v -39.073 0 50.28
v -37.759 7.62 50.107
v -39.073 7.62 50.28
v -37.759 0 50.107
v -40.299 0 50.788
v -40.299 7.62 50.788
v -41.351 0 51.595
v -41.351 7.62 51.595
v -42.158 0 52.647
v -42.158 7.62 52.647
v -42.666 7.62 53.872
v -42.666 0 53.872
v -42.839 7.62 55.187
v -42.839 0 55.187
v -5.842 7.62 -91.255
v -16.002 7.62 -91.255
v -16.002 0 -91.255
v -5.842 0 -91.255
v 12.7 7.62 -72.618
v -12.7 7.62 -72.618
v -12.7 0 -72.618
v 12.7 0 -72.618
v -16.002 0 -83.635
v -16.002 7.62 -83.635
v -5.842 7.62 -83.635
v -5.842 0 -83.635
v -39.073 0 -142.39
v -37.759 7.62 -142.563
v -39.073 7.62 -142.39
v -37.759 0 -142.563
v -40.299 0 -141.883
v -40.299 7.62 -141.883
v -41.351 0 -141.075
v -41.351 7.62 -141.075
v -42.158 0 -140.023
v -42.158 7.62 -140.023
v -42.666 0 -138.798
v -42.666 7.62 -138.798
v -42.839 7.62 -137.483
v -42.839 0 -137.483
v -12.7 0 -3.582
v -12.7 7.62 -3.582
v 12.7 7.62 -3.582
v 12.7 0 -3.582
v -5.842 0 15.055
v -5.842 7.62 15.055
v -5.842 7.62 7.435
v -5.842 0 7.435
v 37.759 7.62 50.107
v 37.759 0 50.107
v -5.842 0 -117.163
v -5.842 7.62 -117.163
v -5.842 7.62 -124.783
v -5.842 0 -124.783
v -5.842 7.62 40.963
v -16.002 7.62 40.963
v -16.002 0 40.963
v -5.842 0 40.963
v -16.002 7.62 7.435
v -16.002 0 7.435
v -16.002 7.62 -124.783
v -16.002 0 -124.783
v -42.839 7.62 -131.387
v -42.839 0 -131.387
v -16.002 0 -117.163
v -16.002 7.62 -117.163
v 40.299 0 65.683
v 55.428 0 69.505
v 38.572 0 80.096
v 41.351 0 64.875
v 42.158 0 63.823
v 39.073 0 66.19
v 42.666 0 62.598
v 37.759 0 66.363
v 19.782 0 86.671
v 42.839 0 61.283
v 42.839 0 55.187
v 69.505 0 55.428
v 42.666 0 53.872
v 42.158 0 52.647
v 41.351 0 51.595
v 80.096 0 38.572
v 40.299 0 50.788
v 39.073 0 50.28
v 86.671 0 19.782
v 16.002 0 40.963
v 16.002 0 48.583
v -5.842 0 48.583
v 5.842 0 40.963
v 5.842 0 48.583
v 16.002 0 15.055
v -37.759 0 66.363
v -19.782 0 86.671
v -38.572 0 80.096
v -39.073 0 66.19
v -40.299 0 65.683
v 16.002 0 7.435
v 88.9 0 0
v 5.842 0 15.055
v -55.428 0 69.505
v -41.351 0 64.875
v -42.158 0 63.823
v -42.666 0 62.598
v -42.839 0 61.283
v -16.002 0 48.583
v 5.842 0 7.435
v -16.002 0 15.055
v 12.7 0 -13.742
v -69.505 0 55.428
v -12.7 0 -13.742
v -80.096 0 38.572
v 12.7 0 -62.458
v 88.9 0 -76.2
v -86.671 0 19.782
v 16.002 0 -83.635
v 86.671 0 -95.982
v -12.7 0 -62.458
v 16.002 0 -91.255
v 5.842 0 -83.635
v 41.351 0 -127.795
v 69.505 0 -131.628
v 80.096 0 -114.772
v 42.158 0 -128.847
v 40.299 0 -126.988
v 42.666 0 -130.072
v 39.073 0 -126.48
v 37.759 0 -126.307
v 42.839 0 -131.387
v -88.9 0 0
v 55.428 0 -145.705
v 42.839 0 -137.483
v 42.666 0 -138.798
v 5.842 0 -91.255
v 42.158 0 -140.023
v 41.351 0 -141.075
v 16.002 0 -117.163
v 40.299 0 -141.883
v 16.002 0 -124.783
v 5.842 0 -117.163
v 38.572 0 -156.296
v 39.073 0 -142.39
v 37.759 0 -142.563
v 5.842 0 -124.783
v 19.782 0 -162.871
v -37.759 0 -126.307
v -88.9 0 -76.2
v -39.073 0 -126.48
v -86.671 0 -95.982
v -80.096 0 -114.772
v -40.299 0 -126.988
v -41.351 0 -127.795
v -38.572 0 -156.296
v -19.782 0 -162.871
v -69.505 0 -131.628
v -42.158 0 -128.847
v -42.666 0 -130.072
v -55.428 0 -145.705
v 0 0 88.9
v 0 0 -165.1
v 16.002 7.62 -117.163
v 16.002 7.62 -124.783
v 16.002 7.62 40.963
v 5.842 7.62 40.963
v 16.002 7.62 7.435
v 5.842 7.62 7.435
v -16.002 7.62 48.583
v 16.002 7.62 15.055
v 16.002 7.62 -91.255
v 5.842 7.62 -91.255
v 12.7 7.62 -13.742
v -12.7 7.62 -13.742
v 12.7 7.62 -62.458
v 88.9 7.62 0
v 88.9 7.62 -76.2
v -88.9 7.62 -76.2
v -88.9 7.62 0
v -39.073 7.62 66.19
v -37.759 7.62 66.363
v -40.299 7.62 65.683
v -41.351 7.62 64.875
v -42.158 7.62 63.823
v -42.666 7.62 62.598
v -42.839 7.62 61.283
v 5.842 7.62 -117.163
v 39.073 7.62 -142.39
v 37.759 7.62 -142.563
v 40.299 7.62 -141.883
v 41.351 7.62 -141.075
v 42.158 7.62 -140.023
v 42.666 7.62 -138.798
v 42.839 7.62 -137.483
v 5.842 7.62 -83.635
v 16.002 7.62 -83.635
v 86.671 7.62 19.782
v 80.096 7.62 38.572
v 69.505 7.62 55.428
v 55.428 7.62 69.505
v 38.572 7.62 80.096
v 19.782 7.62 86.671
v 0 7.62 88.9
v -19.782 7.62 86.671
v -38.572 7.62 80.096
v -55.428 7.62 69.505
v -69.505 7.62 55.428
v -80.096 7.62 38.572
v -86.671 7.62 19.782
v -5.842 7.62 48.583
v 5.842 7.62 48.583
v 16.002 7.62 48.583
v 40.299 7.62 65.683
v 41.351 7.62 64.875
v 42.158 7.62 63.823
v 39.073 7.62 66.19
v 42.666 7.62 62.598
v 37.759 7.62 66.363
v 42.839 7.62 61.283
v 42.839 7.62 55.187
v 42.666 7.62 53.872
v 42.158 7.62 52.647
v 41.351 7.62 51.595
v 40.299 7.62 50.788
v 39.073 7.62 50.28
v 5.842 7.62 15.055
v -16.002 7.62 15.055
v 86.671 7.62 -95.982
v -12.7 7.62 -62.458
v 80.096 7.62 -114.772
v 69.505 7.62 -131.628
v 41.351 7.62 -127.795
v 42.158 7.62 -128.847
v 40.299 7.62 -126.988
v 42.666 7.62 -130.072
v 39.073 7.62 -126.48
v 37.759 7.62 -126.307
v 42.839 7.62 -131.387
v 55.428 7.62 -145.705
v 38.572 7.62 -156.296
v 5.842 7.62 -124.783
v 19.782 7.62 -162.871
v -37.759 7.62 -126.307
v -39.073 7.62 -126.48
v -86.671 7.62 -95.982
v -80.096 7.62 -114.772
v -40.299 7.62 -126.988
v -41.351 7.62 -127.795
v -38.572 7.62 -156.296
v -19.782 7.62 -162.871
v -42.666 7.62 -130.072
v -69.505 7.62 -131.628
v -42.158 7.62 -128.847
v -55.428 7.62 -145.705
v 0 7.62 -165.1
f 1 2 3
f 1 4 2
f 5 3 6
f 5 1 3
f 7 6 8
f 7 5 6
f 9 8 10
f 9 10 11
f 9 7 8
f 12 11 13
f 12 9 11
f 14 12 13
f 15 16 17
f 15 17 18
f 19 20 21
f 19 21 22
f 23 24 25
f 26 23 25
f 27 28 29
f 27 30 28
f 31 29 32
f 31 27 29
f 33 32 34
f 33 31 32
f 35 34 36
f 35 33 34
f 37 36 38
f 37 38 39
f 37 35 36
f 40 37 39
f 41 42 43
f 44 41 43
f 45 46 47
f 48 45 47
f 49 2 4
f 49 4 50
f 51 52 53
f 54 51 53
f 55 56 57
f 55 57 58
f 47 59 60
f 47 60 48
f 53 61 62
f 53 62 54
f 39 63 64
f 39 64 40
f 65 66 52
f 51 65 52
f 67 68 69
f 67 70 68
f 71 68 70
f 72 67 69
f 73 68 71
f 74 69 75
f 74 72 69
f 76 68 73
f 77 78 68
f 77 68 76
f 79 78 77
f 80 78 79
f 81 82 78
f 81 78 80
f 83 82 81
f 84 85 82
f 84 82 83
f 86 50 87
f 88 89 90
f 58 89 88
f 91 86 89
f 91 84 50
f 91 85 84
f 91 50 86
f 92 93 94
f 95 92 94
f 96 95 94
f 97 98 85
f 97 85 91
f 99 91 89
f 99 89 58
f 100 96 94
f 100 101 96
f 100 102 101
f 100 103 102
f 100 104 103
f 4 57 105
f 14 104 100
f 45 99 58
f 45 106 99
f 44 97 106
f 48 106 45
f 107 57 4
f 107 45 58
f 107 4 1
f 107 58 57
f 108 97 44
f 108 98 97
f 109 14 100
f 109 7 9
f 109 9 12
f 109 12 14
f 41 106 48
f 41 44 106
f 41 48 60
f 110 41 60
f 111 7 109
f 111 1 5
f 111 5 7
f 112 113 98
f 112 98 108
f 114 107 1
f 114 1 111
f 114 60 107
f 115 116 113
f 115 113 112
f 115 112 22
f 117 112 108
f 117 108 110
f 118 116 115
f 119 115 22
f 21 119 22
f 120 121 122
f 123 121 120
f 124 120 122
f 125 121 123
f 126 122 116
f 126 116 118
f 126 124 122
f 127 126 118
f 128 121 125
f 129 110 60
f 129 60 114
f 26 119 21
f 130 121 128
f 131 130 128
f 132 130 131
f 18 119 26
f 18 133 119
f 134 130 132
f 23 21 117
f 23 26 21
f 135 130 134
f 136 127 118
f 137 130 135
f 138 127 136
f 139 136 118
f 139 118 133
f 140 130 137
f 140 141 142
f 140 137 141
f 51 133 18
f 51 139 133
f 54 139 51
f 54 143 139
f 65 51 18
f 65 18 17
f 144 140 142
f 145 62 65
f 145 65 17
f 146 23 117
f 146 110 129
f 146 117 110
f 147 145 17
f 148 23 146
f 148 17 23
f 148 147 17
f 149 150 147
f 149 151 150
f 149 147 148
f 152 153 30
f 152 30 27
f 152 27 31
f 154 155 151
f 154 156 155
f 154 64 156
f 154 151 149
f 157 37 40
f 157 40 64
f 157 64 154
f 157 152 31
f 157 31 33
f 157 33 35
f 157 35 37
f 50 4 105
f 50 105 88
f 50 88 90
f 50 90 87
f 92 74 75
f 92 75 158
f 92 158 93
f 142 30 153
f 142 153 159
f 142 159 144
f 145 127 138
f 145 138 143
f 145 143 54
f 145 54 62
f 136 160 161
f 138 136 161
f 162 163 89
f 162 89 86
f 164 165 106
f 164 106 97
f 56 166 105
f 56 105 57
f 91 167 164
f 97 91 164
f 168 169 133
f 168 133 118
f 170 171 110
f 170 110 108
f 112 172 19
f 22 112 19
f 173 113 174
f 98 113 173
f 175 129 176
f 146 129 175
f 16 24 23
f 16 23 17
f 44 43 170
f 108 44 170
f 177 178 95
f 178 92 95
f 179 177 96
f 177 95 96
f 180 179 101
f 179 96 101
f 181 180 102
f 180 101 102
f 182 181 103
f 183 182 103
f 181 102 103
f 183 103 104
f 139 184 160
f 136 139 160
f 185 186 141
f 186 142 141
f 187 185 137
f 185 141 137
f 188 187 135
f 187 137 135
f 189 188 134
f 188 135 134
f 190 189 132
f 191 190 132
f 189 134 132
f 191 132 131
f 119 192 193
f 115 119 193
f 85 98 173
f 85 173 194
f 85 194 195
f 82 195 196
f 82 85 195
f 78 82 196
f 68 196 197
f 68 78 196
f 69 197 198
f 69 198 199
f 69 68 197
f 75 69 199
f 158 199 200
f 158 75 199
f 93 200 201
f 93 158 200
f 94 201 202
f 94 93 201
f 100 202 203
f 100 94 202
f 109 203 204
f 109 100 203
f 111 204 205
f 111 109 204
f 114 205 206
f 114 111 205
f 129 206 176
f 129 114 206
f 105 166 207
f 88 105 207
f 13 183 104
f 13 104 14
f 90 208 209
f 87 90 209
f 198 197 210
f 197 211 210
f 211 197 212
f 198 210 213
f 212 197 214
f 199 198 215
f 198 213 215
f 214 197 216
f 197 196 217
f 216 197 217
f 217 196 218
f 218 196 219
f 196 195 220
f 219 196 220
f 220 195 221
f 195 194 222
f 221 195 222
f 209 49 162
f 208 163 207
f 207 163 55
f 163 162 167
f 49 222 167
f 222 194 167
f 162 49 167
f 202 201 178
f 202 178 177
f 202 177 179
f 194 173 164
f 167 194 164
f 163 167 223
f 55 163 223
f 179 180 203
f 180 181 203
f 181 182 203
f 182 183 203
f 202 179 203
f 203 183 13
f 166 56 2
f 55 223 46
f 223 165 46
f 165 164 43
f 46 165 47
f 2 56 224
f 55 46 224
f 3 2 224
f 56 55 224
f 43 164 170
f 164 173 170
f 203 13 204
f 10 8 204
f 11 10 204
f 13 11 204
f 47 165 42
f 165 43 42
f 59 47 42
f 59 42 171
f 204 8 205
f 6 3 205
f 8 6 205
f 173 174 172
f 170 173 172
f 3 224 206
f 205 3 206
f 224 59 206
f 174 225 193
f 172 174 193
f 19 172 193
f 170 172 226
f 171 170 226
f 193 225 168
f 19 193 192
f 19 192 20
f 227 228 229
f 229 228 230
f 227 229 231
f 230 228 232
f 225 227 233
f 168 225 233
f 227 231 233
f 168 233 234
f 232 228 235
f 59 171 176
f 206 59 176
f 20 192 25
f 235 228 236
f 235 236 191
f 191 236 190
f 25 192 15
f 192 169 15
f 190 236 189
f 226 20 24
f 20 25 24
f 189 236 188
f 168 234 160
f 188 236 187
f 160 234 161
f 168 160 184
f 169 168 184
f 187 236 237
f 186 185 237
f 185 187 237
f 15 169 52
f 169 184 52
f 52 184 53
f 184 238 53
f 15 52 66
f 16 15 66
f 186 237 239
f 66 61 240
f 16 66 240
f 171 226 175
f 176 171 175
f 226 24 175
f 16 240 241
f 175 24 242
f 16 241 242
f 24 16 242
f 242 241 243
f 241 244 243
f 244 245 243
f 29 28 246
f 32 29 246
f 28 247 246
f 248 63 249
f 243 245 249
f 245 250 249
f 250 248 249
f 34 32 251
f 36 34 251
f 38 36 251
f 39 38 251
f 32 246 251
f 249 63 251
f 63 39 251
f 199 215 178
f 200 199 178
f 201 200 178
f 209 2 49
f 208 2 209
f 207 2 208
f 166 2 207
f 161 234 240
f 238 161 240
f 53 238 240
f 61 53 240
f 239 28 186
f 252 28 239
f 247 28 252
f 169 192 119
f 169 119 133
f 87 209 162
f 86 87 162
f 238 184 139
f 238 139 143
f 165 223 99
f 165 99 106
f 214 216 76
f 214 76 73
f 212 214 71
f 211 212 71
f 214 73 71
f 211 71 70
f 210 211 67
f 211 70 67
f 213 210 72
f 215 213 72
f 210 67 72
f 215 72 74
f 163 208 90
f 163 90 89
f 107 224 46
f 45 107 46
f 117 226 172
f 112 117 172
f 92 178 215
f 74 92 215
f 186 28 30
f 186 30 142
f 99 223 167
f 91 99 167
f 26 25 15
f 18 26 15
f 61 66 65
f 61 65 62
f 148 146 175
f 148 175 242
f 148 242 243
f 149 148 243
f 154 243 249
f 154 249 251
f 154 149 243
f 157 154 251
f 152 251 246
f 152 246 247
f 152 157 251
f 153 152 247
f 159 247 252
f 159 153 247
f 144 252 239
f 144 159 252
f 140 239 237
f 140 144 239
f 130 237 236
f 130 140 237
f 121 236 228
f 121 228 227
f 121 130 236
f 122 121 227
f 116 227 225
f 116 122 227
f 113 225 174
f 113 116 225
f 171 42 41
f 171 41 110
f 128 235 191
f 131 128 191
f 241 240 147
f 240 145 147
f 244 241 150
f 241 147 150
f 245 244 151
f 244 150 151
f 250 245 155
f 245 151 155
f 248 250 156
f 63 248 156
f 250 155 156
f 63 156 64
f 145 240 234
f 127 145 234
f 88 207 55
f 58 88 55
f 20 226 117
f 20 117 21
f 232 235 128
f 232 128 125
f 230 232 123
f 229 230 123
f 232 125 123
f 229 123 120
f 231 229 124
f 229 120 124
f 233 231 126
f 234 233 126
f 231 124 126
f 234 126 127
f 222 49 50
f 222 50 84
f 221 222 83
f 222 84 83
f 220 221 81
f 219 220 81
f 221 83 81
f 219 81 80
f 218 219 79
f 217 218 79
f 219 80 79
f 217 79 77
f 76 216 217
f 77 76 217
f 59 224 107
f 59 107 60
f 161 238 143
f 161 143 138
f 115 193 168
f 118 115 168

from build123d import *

# Parameters (mm, degrees)
BOSS_EXTRUDE1_DEPTH     = 7.62
SKETCH2_W               = 85.677392152
SKETCH2_H               = 16.256
CUT_EXTRUDE1_DEPTH      = 1
CUT_EXTRUDE1_DEPTH_BACK = 8.62
FILLET1_R               = 5.08
SKETCH3_W               = 10.16
SKETCH3_H               = 7.62
CUT_EXTRUDE2_DEPTH      = 8.62
SKETCH4_W               = 25.4
SKETCH4_H               = 10.16
CUT_EXTRUDE3_DEPTH      = 8.62


with BuildPart() as part:
    # Sketch1 → Boss-Extrude1 (new body)
    with BuildSketch(Plane(origin=(0, 0, 0), x_dir=(1, 0, 0), z_dir=(0, 1, 0))):
        with BuildLine():
            Line((-88.9, 0), (-88.9, 76.2))
            ThreePointArc((-88.9, 76.2), (0, 165.1), (88.9, 76.2))
            Line((88.9, 76.2), (88.9, 0))
            ThreePointArc((88.9, 0), (0, -88.9), (-88.9, 0))
        make_face()
    extrude(amount=BOSS_EXTRUDE1_DEPTH)

    # Sketch2 → Cut-Extrude1 (cut, two sides)
    with BuildSketch(Plane(origin=(0, 7.62, 0), x_dir=(1, 0, 0), z_dir=(0, 1, 0))) as cut_extrude1_sk:
        with Locations((0, -58.235236409)):
            Rectangle(SKETCH2_W, SKETCH2_H)
        with Locations((0, 134.435236409)):
            Rectangle(SKETCH2_W, SKETCH2_H)
    extrude(amount=CUT_EXTRUDE1_DEPTH, mode=Mode.SUBTRACT)
    extrude(cut_extrude1_sk.sketch, amount=-CUT_EXTRUDE1_DEPTH_BACK, mode=Mode.SUBTRACT)

    # Fillet1
    fillet1_edges = [part.edges().sort_by_distance(p)[0] for p in [
        (-42.838696076, 3.81, 66.363236409),
        (-42.838696076, 3.81, 50.107236409),
        (42.838696076, 3.81, 50.107236409),
        (42.838696076, 3.81, 66.363236409),
        (-42.838696076, 3.81, -126.307236409),
        (-42.838696076, 3.81, -142.563236409),
        (42.838696076, 3.81, -142.563236409),
        (42.838696076, 3.81, -126.307236409),
    ]]
    fillet(fillet1_edges, radius=FILLET1_R)

    # Sketch3 → Cut-Extrude2 (cut, through all)
    with BuildSketch(Plane(origin=(0, 7.62, 0), x_dir=(1, 0, 0), z_dir=(0, 1, 0))):
        with Locations((10.922, 87.445236409)):
            Rectangle(SKETCH3_W, SKETCH3_H)
        with Locations((-10.922, 87.445236409)):
            Rectangle(SKETCH3_W, SKETCH3_H)
        with Locations((10.922, 120.973236409)):
            Rectangle(SKETCH3_W, SKETCH3_H)
        with Locations((-10.922, 120.973236409)):
            Rectangle(SKETCH3_W, SKETCH3_H)
        with Locations((-10.922, -11.245236409)):
            Rectangle(SKETCH3_W, SKETCH3_H)
        with Locations((10.922, -11.245236409)):
            Rectangle(SKETCH3_W, SKETCH3_H)
        with Locations((-10.922, -44.773236409)):
            Rectangle(SKETCH3_W, SKETCH3_H)
        with Locations((10.922, -44.773236409)):
            Rectangle(SKETCH3_W, SKETCH3_H)
    extrude(amount=-CUT_EXTRUDE2_DEPTH, mode=Mode.SUBTRACT)

    # Sketch4 → Cut-Extrude3 (cut, through all)
    with BuildSketch(Plane(origin=(0, 7.62, 0), x_dir=(1, 0, 0), z_dir=(0, 1, 0))):
        with Locations((0, 67.537940424)):
            Rectangle(SKETCH4_W, SKETCH4_H)
        with Locations((0, 8.662059576)):
            Rectangle(SKETCH4_W, SKETCH4_H)
    extrude(amount=-CUT_EXTRUDE3_DEPTH, mode=Mode.SUBTRACT)


solid = part.part
